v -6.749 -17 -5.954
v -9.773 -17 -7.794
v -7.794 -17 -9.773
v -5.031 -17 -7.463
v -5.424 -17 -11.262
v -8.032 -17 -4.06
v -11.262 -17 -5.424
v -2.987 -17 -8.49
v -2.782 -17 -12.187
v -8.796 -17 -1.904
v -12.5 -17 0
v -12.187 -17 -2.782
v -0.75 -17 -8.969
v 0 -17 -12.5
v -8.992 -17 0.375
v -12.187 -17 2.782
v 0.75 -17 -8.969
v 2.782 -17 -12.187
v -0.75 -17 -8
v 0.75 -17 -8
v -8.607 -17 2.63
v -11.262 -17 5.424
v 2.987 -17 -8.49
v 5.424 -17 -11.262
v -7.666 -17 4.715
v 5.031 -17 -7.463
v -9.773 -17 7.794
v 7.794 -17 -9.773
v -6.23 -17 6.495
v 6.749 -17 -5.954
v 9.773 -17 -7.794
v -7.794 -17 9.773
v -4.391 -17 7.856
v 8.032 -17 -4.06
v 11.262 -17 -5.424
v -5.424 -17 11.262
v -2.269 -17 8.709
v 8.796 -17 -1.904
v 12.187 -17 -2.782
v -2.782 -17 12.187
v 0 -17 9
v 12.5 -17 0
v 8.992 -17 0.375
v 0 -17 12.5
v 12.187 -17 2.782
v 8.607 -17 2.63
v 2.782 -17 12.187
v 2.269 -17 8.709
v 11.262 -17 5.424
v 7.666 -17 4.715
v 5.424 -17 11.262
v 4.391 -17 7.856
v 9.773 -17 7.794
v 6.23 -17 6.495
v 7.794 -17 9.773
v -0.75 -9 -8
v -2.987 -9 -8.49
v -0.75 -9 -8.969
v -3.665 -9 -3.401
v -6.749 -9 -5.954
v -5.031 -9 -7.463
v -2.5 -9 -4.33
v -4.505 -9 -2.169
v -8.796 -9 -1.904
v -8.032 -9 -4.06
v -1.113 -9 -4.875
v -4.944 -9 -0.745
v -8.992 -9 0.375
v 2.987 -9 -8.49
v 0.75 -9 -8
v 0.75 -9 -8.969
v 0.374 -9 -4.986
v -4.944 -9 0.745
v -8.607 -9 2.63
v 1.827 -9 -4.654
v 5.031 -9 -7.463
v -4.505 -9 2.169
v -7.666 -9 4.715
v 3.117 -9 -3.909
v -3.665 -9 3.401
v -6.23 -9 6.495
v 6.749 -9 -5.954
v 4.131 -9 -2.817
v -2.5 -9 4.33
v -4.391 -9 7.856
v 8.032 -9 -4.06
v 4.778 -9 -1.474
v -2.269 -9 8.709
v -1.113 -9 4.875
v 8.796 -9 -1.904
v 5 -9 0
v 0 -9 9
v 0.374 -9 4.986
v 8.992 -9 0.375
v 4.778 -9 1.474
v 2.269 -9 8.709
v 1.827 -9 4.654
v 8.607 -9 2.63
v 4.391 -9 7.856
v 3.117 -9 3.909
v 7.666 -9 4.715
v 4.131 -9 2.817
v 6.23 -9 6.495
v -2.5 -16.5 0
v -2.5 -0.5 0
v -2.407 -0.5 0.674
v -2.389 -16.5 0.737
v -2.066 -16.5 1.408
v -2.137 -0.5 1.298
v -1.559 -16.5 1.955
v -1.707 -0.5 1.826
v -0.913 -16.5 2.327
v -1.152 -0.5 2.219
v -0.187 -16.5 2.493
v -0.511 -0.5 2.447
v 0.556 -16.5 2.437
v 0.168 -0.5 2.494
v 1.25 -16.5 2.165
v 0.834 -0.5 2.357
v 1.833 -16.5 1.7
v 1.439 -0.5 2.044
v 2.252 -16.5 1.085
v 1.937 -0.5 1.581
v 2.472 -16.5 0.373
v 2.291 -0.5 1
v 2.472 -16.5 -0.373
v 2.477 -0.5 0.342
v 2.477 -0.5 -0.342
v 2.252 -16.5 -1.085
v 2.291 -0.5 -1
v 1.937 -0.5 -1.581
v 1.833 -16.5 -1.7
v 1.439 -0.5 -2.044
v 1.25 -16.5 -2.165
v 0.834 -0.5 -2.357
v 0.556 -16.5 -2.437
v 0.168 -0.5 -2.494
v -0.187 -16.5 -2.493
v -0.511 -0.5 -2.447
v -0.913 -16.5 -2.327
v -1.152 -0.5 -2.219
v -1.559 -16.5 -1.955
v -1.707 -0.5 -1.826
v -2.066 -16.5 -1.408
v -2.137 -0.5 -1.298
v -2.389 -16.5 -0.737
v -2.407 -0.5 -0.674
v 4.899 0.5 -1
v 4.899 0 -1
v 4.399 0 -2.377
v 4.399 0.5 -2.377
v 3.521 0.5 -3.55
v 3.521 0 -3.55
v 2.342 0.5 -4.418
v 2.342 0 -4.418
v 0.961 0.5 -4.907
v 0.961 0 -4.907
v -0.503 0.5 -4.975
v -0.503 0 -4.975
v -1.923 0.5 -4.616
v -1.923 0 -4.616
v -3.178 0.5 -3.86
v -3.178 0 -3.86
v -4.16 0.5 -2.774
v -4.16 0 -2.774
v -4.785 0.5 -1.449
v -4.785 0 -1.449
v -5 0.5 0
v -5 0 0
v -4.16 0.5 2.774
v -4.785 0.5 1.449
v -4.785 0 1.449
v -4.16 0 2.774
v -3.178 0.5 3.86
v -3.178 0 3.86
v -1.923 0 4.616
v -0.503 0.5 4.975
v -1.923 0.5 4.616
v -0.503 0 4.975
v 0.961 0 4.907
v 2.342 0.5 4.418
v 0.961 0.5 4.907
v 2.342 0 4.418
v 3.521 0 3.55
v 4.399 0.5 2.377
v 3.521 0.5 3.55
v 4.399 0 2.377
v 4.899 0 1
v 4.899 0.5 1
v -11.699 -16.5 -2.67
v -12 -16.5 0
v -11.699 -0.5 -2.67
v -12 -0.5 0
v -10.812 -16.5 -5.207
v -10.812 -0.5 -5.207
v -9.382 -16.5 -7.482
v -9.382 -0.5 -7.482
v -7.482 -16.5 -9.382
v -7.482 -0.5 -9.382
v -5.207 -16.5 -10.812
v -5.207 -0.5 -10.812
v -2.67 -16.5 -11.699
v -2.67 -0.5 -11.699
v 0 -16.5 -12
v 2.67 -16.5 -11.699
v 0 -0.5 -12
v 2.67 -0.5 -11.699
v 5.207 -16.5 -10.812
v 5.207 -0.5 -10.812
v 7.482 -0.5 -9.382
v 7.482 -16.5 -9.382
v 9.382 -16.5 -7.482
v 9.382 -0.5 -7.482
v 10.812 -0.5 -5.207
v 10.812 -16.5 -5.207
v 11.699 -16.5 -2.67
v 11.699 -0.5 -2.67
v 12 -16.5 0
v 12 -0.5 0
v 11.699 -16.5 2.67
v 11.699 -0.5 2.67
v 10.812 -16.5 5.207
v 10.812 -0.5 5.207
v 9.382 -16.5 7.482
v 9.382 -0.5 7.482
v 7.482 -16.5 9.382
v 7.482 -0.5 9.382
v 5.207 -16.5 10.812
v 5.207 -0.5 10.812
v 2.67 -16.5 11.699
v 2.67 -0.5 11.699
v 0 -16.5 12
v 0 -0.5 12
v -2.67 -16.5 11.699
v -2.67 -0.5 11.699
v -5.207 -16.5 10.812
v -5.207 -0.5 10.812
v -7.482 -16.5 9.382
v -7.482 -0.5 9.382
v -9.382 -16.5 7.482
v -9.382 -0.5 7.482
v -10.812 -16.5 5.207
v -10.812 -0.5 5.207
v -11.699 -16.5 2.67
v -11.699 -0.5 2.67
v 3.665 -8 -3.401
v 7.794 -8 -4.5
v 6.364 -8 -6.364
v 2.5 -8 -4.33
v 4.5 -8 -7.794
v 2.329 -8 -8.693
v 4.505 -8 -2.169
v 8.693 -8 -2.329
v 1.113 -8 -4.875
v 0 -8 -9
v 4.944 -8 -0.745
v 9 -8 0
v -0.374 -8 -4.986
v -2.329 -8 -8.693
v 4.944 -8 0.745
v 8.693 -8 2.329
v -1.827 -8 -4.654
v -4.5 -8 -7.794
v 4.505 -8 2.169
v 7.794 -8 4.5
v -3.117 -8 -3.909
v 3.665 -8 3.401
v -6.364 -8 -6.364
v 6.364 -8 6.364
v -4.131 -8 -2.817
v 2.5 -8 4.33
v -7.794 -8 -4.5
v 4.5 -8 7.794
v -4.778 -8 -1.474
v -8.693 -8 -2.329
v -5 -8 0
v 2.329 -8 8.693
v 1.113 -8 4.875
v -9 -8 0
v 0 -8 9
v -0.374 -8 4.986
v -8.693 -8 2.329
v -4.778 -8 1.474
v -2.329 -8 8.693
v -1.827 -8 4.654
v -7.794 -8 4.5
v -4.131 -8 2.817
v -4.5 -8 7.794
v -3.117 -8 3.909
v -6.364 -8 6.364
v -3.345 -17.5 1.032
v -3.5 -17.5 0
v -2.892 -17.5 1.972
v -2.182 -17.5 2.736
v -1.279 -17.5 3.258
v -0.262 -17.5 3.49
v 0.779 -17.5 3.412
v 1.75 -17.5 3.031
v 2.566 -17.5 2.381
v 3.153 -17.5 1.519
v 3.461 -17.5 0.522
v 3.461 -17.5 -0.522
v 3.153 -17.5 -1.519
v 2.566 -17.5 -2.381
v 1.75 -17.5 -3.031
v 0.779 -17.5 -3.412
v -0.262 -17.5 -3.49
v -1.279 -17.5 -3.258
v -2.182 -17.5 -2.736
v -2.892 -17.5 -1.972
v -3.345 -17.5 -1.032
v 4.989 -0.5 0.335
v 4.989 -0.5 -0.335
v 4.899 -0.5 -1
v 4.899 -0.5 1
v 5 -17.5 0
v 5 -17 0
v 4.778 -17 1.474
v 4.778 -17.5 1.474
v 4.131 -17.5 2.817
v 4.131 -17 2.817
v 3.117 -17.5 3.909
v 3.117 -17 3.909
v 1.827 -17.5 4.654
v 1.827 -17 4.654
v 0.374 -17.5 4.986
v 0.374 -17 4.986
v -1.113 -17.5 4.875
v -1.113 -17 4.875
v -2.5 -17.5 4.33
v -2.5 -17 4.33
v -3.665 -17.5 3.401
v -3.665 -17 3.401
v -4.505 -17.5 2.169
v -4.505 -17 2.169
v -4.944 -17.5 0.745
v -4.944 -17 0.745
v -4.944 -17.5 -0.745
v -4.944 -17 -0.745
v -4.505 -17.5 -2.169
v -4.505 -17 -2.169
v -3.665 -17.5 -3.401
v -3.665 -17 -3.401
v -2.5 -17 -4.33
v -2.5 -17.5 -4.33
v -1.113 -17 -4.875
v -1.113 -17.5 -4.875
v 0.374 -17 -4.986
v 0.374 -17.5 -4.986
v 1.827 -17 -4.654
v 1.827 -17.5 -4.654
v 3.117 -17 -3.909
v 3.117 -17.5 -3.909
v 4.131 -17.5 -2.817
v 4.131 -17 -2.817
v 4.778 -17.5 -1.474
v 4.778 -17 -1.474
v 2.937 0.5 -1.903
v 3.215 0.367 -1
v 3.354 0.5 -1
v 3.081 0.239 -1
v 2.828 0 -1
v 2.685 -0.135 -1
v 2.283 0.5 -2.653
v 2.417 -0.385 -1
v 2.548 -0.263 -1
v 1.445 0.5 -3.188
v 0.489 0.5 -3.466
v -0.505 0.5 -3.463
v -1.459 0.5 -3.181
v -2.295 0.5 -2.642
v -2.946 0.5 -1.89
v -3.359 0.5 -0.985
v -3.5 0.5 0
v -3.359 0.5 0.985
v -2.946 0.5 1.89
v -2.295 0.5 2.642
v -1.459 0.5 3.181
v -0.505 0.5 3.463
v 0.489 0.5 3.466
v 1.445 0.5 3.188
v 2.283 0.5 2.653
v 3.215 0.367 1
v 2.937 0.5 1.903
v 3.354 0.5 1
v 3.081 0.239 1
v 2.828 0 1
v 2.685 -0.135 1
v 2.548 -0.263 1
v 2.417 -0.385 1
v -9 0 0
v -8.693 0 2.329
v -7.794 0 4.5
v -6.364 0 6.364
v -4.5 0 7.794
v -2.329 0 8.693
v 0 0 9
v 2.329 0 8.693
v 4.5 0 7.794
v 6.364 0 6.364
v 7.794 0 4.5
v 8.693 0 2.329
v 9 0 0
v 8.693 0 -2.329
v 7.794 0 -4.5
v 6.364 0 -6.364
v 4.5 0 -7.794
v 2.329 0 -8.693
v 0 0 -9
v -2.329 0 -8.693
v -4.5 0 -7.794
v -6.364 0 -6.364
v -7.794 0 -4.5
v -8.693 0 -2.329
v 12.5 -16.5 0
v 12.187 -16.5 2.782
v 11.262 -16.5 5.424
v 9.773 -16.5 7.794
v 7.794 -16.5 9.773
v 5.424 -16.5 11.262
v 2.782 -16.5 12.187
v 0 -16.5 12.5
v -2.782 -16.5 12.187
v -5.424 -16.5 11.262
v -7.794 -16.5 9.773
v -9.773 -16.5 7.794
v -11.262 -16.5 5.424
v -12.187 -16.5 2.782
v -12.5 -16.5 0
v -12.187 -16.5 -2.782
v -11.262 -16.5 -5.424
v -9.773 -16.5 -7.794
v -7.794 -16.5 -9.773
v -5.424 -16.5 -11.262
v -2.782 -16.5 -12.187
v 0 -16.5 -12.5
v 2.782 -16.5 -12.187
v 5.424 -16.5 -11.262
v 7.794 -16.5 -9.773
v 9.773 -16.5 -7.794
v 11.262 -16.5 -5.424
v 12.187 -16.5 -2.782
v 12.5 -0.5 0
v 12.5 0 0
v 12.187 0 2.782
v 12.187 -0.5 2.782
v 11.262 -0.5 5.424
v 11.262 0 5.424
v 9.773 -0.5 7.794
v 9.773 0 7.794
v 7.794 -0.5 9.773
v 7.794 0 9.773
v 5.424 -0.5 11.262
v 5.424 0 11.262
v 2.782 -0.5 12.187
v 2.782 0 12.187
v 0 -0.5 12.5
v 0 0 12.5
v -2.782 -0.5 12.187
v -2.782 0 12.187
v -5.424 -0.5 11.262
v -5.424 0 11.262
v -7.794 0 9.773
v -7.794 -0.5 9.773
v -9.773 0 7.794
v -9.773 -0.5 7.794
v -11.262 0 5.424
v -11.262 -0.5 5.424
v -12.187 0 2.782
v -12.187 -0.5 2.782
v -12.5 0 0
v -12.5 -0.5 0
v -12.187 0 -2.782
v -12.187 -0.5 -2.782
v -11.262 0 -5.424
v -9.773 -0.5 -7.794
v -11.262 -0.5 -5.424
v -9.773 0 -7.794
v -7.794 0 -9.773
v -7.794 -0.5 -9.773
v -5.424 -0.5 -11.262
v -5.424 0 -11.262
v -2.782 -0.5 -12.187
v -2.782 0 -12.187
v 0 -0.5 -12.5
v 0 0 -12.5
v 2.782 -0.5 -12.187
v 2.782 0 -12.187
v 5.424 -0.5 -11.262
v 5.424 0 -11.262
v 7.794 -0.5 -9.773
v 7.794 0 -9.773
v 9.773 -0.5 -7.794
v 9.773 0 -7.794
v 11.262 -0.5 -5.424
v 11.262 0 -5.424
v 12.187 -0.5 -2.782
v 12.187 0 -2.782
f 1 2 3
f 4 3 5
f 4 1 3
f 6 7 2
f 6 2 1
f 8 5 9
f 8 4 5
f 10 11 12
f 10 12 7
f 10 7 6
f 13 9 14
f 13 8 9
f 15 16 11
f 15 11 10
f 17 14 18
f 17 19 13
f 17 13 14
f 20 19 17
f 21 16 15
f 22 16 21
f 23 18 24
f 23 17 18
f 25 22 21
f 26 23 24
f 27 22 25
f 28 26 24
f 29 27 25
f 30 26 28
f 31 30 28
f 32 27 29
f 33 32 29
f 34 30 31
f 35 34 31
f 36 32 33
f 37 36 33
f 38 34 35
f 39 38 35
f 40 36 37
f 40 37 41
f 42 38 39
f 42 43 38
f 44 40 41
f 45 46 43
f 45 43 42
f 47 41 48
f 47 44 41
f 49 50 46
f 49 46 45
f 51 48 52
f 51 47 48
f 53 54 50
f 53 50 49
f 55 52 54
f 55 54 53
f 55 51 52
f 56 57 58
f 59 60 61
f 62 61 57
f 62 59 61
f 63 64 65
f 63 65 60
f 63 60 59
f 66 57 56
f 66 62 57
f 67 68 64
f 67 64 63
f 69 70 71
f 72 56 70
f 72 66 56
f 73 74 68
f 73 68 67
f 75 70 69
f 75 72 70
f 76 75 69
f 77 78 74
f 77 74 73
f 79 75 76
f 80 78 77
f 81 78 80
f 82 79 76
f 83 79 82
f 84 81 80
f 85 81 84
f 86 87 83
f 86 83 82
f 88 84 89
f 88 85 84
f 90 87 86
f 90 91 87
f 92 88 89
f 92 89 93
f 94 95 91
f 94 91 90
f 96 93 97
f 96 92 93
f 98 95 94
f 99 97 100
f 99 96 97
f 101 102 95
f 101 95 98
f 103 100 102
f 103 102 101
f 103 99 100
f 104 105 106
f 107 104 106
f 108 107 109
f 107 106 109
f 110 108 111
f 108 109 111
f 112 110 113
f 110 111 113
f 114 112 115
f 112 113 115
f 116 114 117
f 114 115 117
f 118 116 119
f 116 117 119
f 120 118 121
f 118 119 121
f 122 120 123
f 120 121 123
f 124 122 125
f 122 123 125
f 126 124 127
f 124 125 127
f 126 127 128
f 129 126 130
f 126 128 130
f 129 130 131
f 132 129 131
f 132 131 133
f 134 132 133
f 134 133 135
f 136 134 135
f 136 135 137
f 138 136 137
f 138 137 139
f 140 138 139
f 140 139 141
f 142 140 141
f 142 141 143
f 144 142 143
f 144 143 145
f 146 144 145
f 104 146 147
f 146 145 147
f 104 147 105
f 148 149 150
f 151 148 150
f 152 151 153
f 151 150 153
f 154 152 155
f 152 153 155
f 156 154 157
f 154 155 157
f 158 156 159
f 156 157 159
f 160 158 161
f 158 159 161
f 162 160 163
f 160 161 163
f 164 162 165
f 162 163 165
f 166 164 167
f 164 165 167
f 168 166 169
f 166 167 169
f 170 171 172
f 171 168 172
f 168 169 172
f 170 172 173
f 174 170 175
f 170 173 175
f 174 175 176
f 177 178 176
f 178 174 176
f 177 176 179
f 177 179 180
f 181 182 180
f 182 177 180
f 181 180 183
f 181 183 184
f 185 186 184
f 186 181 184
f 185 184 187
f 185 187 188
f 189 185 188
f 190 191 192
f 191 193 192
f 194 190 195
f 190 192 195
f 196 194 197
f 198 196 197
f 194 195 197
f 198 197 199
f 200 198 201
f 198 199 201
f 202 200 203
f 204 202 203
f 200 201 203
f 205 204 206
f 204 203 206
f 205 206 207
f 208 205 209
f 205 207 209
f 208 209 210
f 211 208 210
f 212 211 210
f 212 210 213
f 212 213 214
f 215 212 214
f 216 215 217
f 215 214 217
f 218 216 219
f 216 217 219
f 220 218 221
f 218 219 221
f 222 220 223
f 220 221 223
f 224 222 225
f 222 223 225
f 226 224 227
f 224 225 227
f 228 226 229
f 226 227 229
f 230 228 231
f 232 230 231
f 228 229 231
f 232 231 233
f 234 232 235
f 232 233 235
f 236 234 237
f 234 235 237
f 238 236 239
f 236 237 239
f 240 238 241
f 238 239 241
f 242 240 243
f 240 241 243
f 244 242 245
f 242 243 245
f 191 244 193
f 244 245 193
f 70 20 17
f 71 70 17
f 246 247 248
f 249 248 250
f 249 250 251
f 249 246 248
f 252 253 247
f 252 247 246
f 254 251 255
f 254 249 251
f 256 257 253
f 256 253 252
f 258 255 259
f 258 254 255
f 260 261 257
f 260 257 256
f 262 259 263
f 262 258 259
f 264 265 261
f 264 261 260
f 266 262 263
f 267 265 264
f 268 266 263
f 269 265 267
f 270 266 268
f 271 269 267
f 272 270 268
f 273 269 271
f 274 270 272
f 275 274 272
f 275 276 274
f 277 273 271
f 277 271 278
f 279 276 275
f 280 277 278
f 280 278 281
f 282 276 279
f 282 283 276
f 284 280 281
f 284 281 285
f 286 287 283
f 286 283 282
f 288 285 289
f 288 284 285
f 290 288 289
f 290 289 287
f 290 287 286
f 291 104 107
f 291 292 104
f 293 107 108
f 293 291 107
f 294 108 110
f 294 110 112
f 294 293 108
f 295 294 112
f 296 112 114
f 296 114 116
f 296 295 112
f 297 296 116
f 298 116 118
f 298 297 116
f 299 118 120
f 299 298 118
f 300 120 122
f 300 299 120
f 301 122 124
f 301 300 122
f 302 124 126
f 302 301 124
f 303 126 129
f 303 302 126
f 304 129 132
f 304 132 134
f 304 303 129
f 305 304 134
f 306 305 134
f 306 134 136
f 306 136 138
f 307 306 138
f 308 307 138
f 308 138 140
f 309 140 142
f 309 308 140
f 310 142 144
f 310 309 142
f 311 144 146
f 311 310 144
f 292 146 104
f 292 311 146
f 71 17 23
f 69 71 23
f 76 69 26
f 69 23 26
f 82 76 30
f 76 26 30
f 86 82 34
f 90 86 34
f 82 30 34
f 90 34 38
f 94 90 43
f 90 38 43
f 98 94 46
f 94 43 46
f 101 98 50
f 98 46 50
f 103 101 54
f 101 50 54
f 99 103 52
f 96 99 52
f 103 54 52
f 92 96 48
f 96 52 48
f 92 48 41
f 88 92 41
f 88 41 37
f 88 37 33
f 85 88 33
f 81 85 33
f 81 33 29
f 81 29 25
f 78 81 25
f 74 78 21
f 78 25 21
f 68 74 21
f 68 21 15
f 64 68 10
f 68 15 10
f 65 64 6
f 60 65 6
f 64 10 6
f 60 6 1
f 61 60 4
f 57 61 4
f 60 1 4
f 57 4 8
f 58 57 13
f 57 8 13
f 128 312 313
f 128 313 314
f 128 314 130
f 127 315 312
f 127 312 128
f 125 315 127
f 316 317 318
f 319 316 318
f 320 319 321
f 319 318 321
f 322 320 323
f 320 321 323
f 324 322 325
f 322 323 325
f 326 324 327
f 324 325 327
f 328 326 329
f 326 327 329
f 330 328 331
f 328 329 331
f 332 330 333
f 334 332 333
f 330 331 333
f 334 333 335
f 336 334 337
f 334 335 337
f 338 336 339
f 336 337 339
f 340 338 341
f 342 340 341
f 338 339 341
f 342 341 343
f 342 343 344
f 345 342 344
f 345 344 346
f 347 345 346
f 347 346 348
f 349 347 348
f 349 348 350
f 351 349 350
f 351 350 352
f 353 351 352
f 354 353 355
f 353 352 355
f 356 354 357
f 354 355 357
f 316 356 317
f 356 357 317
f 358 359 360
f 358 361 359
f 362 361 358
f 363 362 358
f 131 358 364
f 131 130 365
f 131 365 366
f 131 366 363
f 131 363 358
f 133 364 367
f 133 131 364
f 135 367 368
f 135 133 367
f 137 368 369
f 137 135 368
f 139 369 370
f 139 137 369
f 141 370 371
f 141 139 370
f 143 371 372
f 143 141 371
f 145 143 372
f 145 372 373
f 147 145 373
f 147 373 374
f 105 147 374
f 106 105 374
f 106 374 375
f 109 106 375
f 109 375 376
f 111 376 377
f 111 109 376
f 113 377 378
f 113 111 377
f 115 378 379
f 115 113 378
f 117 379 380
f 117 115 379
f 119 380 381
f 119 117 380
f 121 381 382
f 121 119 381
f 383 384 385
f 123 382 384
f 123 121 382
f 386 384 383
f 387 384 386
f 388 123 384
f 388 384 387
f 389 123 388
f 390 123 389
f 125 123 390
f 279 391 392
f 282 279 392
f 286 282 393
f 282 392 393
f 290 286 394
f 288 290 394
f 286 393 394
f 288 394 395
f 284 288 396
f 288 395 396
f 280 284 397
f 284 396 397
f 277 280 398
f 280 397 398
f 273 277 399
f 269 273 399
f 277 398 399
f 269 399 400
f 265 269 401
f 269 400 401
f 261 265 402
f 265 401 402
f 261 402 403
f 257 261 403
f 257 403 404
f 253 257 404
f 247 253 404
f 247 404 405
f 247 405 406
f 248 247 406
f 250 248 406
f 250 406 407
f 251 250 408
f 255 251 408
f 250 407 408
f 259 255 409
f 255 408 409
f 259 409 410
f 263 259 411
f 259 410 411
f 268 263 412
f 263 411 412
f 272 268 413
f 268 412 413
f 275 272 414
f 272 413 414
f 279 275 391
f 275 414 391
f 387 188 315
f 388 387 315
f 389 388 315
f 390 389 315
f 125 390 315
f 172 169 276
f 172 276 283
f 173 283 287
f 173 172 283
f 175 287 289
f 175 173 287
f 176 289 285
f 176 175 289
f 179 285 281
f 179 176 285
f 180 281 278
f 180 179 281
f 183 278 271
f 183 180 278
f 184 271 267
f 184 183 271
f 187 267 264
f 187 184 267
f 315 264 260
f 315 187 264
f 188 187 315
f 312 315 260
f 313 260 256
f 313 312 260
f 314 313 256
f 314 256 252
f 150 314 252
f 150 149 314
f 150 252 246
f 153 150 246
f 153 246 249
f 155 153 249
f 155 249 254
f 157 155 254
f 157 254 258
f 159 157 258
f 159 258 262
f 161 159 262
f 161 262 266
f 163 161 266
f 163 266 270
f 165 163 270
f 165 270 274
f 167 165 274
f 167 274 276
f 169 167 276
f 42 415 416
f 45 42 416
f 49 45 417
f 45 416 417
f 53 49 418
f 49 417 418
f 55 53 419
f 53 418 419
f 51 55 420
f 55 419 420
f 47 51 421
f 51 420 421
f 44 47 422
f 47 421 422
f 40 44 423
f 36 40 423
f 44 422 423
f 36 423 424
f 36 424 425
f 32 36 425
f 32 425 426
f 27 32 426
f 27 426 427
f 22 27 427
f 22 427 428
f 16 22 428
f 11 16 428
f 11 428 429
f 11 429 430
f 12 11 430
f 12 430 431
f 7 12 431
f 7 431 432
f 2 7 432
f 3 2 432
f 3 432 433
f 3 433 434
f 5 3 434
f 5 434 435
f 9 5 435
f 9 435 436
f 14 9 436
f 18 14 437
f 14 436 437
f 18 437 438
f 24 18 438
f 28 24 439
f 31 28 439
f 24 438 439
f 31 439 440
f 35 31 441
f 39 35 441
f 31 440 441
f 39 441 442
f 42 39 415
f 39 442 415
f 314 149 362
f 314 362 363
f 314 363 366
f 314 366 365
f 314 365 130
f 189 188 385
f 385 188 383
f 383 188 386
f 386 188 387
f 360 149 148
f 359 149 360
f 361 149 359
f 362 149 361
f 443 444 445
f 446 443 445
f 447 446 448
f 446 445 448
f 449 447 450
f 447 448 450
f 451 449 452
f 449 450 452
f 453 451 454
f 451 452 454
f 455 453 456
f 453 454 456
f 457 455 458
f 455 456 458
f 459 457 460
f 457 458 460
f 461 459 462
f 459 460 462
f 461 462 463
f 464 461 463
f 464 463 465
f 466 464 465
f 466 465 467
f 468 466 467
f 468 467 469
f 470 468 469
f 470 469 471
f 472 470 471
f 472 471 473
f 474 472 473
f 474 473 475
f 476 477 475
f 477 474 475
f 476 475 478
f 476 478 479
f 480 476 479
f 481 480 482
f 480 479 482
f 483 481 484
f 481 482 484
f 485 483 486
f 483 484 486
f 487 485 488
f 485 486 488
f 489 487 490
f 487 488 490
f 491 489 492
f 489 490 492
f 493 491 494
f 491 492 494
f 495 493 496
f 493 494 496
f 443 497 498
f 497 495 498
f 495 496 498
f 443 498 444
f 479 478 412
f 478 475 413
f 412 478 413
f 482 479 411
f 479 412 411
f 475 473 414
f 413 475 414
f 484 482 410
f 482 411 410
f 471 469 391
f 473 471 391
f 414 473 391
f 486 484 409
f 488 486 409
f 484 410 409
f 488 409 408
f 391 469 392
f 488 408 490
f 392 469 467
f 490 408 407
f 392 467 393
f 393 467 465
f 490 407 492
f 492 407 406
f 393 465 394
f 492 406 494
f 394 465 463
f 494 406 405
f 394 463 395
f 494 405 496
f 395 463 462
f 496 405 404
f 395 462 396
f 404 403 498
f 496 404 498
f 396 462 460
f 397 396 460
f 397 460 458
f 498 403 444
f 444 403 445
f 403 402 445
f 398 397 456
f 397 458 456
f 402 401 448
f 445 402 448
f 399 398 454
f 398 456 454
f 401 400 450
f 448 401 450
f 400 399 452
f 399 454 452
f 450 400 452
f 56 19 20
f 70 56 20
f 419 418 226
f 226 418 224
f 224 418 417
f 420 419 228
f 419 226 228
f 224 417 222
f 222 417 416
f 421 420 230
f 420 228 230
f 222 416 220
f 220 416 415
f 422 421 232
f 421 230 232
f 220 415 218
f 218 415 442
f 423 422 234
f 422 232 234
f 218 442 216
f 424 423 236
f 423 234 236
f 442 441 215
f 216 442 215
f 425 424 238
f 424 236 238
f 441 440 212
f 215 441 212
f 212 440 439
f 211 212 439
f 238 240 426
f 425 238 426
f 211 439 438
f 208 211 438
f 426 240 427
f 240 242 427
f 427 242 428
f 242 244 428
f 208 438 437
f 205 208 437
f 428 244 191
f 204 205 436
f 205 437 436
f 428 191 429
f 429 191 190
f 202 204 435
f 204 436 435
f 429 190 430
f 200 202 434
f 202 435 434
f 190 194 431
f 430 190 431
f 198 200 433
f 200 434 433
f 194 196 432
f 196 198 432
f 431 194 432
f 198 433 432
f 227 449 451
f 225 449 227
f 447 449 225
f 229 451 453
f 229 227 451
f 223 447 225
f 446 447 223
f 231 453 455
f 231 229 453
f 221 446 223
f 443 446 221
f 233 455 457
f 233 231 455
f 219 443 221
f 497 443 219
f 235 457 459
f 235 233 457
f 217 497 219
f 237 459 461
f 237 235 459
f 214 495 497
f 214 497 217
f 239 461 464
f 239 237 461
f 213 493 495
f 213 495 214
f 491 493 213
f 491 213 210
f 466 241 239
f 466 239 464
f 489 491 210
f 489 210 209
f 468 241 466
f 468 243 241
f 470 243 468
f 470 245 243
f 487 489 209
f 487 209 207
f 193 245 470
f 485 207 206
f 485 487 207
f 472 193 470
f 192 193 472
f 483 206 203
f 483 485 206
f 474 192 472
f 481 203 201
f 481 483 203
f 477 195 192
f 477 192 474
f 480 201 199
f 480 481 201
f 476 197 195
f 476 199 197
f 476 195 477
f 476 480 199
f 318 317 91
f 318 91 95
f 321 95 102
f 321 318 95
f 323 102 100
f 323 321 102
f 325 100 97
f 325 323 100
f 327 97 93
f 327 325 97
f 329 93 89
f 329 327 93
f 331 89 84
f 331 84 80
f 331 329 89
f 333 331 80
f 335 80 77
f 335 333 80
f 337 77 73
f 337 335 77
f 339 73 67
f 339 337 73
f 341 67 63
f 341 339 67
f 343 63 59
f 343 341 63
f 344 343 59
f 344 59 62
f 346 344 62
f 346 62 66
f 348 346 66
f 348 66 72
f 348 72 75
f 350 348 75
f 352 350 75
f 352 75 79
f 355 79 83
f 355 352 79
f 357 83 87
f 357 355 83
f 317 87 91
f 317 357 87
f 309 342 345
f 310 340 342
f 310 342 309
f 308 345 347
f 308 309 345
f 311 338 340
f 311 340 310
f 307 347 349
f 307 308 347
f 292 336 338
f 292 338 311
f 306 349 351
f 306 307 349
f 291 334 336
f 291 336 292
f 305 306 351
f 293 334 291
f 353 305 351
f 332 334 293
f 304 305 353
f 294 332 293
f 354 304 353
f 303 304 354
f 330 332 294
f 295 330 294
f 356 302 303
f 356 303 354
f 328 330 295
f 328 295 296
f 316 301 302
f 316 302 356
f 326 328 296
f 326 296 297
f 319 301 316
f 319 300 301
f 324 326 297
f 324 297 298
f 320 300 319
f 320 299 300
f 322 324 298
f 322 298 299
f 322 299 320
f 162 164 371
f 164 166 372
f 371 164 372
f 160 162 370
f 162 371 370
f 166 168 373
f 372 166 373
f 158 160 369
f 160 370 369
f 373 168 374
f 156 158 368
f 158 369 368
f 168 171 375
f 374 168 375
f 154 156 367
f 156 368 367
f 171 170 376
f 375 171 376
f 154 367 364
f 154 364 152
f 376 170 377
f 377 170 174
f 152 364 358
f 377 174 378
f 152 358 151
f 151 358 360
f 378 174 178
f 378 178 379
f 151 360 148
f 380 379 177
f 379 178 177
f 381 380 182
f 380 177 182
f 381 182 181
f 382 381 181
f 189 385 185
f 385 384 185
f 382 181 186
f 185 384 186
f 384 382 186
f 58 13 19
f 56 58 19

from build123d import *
from build123d import SkipClean  # not in build123d's __all__

# Parameters (mm, degrees)
F0_R         = 12.5
F1_DEPTH     = 17
F2_W         = 1.5
F2_H         = 16
F4_R         = 2.5
F5_DEPTH     = 17.001
F6_R         = 9
F6_R_2       = 5
F7_DEPTH     = 8
F8_W         = 4.9303688211
F8_H         = 2
F9_DEPTH     = 0.5
F10_R        = 5
F11_DEPTH    = 8
F12_DEPTH    = 0.5
F13_DEPTH    = 0.5
F14_T4_ANGLE = 359.64


# Not quite as in the source:
# - a fillet or chamfer that OpenCascade refuses, or shapes differently, is made with other operations: its cross-section is extruded or revolved along the edge and cut away or added
# - after a boolean that leaves OpenCascade's solid faulty, fix() repairs it


with BuildPart() as f1:
    # F0 (on Front) → F1 (new body)
    with BuildSketch(Plane.XZ):
        Circle(F0_R)
    extrude(amount=F1_DEPTH)

    # F2 (on Top) → F3 (revolve, cut)
    with BuildSketch(Plane.XY):
        with Locations((-12.75, -8.5)):
            Rectangle(F2_W, F2_H)
    revolve(axis=Axis((0, -8.2131072704, 0), (0, -1, 0)), mode=Mode.SUBTRACT)

    # F4 (on face) → F5 (cut, through all)
    with BuildSketch(Plane(origin=(0, 0, 0), x_dir=(-1, 0, 0), z_dir=(0, 1, 0))):
        Circle(F4_R)
    extrude(amount=-F5_DEPTH, mode=Mode.SUBTRACT)

    # F6 (on face) → F7 (cut)
    with BuildSketch(Plane(origin=(0, 0, 0), x_dir=(-1, 0, 0), z_dir=(0, 1, 0))):
        Circle(F6_R)
        Circle(F6_R_2, mode=Mode.SUBTRACT)
    extrude(amount=-F7_DEPTH, mode=Mode.SUBTRACT)

    # F8 (on face) → F9 (cut)
    with BuildSketch(Plane(origin=(0, 0, 0), x_dir=(-1, 0, 0), z_dir=(0, 1, 0))):
        with Locations((-3.8676508702, 0)):
            Rectangle(F8_W, F8_H)
    extrude(amount=-F9_DEPTH, mode=Mode.SUBTRACT)

    # F10 (on face) → F11 (cut)
    with BuildSketch(Plane.XZ.offset(17)):
        with BuildLine():
            Line((0.75, -8), (0.75, -8.9686955573))
            ThreePointArc((0.75, -8.9686955573), (0, 9), (-0.75, -8.9686955573))
            Line((-0.75, -8.9686955573), (-0.75, -8))
            Line((-0.75, -8), (0.75, -8))
        make_face()
        Circle(F10_R, mode=Mode.SUBTRACT)
    extrude(amount=-F11_DEPTH, mode=Mode.SUBTRACT)

    # F12 (add): a face of the model
    f12_faces = [f1.faces().sort_by_distance(p)[0] for p in [
        (-0.4884023099, 0, 4.8346844466),
    ]]
    with SkipClean():  # cleaning this boolean's faces spoils the solid; the shape is the same uncleaned
        extrude(f12_faces, amount=F12_DEPTH)

    # F13 (add): a face of the model
    f13_faces = [f1.faces().sort_by_distance(p)[0] for p in [
        (-4.8585786438, -17, 0),
    ]]
    extrude(f13_faces, amount=F13_DEPTH)

    add(f1.part.fix(), mode=Mode.REPLACE)

    # F14: chamfer of 1 on 2 edges, made by hand

    # F14_s1 → F14_t2 (revolve, cut)
    with BuildSketch(Plane.XY):
        Polygon((-2.5, -16.5), (-3.5, -17.5), (-2.5, -17.5), align=None)
    revolve(axis=Axis((0, -17.5, 0), (0, 1, 0)), mode=Mode.SUBTRACT)

    # F14_s3 → F14_t4 (revolve, cut)
    with BuildSketch(Plane(origin=(0, 0, 0), x_dir=(0, 1, 0), z_dir=(0.0031415875, 0, 0.9999950652))):
        Polygon((0.5, -3.5), (-0.5, -2.5), (0.5, -2.5), align=None)
    revolve(axis=Axis((0, 0.5, 0), (0, 1, 0)), revolution_arc=F14_T4_ANGLE, mode=Mode.SUBTRACT)


solid = f1.part
